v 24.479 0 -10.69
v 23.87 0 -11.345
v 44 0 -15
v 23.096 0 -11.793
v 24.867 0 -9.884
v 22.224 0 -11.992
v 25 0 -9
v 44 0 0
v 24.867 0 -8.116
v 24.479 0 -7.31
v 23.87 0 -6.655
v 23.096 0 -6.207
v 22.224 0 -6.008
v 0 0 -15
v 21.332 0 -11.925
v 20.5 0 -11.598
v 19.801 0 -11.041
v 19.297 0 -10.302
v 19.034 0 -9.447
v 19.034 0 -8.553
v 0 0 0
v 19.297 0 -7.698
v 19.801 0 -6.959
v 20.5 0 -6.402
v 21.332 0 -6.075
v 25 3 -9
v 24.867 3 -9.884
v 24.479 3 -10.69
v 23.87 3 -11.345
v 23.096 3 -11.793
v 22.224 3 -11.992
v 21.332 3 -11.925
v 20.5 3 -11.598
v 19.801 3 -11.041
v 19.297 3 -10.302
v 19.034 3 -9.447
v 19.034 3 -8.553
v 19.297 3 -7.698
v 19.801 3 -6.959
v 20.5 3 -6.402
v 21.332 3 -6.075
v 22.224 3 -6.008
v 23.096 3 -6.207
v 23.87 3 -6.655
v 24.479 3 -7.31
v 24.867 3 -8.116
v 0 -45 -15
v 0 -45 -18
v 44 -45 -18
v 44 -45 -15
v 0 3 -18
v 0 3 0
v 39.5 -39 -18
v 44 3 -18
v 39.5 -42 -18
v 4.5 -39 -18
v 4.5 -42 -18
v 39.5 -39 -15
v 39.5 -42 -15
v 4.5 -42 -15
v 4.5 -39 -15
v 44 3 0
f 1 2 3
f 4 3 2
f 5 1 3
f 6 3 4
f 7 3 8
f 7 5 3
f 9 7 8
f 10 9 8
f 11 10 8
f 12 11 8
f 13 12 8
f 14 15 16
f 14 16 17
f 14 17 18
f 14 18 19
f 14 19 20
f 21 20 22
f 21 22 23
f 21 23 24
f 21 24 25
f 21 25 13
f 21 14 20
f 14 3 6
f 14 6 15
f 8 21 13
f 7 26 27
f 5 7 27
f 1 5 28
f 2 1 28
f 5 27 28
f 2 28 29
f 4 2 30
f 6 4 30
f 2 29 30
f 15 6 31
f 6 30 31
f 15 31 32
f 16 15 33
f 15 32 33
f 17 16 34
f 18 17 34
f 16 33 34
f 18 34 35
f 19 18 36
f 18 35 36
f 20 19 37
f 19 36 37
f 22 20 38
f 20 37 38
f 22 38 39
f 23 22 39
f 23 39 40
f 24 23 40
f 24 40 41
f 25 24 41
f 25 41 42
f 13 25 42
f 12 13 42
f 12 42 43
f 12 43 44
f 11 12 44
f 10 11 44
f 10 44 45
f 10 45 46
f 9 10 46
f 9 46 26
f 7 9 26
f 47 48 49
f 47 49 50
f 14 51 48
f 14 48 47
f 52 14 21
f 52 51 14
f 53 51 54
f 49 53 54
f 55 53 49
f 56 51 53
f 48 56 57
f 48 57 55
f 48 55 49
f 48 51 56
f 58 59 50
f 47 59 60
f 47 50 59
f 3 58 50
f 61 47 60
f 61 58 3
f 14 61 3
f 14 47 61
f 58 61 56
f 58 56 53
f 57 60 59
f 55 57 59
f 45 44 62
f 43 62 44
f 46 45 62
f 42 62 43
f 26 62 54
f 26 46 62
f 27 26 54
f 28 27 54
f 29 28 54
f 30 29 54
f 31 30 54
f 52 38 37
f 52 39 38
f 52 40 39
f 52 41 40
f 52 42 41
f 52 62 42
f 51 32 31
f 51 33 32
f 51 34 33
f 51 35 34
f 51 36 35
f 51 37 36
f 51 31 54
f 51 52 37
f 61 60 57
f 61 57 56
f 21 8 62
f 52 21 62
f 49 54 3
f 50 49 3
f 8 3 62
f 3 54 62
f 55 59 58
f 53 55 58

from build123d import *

# Parameters (mm, degrees)
ESTRUSIONE_ESTRUSIONE6_DEPTH = 44
SCHIZZO9_W                   = 35
SCHIZZO9_H                   = 3
TAGLIO_ESTRUSIONE2_DEPTH     = 44
SCHIZZO10_R                  = 3
TAGLIO_ESTRUSIONE3_DEPTH     = 10


with BuildPart() as part:
    # Schizzo8 → Estrusione-Estrusione6 (new body)
    with BuildSketch(Plane(origin=(0, 0, 0), x_dir=(0, 0, -1), z_dir=(1, 0, 0))):
        Polygon((0, 0), (0, 3), (18, 3), (18, -45), (15, -45), (15, 0), align=None)
    extrude(amount=ESTRUSIONE_ESTRUSIONE6_DEPTH)

    # Schizzo9 → Taglio-Estrusione2 (cut)
    with BuildSketch(Plane.XY.offset(-15)):
        with Locations((22, -40.5)):
            Rectangle(SCHIZZO9_W, SCHIZZO9_H)
    extrude(amount=-TAGLIO_ESTRUSIONE2_DEPTH, mode=Mode.SUBTRACT)

    # Schizzo10 → Taglio-Estrusione3 (cut)
    with BuildSketch(Plane(origin=(0, 3, 0), x_dir=(1, 0, 0), z_dir=(0, 1, 0))):
        with Locations((22, 9)):
            Circle(SCHIZZO10_R)
    extrude(amount=-TAGLIO_ESTRUSIONE3_DEPTH, mode=Mode.SUBTRACT)


solid = part.part
